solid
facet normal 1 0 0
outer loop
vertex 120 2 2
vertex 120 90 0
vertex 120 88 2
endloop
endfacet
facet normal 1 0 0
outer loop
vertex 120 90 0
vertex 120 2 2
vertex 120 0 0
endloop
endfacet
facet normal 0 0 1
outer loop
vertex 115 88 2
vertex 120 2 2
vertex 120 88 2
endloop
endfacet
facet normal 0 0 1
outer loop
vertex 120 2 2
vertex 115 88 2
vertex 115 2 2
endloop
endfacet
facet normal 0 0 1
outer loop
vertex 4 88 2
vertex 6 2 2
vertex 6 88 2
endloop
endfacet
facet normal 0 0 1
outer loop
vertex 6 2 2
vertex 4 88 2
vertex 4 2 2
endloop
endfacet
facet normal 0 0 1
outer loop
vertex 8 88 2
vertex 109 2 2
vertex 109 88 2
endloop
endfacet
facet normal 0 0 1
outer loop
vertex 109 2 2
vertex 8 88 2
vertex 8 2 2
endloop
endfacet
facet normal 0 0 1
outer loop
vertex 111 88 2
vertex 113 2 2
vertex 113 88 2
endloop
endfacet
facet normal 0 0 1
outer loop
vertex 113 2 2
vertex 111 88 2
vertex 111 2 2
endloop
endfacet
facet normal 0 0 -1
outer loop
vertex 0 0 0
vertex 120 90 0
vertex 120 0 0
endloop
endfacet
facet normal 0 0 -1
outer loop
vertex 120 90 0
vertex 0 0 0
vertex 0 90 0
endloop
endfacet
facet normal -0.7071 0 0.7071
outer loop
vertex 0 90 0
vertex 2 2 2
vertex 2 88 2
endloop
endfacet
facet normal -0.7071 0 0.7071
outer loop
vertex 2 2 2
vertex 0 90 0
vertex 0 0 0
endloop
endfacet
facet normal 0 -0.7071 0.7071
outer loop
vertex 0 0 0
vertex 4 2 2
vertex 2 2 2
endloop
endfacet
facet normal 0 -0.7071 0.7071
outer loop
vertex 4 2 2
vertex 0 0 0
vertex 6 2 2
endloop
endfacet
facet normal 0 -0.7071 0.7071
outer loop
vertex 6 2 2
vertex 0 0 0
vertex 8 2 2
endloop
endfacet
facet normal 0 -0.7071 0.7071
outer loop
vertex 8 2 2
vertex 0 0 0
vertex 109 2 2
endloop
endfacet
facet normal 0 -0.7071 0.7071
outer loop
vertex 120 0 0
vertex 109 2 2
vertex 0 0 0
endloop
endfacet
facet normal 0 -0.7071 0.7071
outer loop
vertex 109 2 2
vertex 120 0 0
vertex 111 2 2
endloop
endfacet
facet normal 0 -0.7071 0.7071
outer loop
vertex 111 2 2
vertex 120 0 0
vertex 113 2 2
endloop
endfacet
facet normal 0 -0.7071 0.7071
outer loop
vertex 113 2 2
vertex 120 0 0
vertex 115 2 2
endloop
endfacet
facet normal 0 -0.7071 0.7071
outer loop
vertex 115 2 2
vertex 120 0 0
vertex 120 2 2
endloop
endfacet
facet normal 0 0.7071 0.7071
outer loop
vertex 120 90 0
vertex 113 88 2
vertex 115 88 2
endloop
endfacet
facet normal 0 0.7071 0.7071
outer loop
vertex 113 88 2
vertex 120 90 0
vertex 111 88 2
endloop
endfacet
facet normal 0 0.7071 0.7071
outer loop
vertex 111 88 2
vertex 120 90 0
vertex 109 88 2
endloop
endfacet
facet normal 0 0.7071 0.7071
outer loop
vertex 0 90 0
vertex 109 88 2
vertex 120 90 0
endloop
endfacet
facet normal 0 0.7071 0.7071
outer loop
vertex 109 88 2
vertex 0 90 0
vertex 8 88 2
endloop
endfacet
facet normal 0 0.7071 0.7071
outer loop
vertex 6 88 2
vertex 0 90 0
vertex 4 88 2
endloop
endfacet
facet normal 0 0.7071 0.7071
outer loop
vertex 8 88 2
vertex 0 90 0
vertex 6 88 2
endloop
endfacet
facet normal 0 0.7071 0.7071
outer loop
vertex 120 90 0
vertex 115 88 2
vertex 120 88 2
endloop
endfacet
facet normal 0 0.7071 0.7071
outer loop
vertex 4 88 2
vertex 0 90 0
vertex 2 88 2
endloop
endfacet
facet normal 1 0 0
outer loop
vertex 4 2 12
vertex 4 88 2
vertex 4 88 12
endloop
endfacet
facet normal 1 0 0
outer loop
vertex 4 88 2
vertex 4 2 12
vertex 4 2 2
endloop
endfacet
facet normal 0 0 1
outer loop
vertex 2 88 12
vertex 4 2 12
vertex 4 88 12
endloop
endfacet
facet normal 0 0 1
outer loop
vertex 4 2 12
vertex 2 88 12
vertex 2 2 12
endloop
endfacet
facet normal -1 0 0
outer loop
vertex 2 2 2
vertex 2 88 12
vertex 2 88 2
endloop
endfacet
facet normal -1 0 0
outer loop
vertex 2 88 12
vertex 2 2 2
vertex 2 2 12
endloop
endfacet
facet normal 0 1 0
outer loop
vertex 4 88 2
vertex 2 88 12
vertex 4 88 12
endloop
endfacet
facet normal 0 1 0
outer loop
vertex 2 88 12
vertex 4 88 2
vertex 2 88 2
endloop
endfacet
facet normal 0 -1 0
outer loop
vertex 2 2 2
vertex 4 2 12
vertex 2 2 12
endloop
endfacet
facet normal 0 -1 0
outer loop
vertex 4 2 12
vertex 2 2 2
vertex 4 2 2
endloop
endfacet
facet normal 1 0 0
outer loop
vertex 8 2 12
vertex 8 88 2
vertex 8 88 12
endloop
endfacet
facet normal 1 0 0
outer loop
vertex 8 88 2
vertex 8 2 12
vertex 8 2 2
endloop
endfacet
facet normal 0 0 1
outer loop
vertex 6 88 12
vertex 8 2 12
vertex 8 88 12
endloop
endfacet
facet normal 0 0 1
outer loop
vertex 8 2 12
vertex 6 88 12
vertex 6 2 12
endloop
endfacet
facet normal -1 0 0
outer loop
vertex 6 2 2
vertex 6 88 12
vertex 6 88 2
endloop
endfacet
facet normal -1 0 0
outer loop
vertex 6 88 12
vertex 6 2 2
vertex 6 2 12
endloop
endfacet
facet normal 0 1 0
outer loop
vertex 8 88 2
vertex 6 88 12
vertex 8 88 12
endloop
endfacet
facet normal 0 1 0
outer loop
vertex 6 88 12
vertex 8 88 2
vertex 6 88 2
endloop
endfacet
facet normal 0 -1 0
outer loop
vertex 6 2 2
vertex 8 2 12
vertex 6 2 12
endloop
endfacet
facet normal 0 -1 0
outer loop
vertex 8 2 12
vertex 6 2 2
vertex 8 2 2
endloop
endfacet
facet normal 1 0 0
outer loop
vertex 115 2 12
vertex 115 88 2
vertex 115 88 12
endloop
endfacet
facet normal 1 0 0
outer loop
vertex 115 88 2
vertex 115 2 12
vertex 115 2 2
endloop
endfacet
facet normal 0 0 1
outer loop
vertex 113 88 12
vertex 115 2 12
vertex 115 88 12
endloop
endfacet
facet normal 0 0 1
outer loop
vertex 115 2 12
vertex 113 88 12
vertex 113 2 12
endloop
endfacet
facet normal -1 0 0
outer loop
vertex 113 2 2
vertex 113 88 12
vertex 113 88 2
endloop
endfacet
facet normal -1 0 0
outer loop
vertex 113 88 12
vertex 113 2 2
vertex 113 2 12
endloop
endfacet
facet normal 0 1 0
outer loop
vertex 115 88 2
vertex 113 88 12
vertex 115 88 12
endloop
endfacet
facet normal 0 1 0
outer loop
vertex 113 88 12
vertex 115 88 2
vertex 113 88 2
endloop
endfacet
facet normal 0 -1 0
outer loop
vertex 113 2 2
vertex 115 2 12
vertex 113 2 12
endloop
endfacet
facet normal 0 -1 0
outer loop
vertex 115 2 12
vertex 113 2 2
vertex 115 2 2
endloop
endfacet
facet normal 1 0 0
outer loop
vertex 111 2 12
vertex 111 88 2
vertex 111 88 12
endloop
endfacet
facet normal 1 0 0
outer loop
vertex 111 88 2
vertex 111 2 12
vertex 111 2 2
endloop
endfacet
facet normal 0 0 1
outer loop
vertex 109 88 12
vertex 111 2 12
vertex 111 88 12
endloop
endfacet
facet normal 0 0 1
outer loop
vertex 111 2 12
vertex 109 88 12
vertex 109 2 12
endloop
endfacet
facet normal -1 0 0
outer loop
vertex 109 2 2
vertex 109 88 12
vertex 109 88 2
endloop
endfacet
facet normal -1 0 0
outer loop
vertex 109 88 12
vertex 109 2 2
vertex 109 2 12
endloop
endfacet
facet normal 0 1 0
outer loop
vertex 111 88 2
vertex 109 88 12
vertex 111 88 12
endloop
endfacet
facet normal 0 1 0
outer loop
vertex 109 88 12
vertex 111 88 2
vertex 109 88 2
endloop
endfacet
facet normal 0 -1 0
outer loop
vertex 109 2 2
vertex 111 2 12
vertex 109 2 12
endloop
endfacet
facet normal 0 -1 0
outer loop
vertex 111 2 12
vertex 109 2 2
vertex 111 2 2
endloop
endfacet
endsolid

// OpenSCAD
// file: config.scad
height=120;
width=90;
t=2;    // thickness

clipHeight=10;
clipBottomOffset=5;
// main file
include <config.scad>

x=height;
y=width;

// plate
difference() {
    cube(size=[x, y, t], center=false);
    // upper bound
    rotate([0, -1*45, 0]) {
        translate([0, -0.5, 0]) {
            cube(size=[x, y+1, t], center=false);
        }
    }
    // left bound
    rotate([45, 0, 0]) {
        translate([-0.5, 0, 0]) {
            cube(size=[x+1, y, t], center=false);
        }
    }
    // right bound
    translate([0, y, 0]) {
        rotate([1*45, 0, 0]) {
            translate([-0.5, 0, 0]) {
                cube(size=[x+1, y, 3*t], center=false);
            }
        }
    }
}

// clips
translate([t, t, 0]) {
    cube(size=[t, y-2*t, t+clipHeight], center=false);
}
translate([3*t, t, 0]) {
    cube(size=[t, y-2*t, t+clipHeight], center=false);
}
translate([x-t-clipBottomOffset, t, 0]) {
    cube(size=[t, y-2*t, t+clipHeight], center=false);
}
translate([x-3*t-clipBottomOffset, t, 0]) {
    cube(size=[t, y-2*t, t+clipHeight], center=false);
}
